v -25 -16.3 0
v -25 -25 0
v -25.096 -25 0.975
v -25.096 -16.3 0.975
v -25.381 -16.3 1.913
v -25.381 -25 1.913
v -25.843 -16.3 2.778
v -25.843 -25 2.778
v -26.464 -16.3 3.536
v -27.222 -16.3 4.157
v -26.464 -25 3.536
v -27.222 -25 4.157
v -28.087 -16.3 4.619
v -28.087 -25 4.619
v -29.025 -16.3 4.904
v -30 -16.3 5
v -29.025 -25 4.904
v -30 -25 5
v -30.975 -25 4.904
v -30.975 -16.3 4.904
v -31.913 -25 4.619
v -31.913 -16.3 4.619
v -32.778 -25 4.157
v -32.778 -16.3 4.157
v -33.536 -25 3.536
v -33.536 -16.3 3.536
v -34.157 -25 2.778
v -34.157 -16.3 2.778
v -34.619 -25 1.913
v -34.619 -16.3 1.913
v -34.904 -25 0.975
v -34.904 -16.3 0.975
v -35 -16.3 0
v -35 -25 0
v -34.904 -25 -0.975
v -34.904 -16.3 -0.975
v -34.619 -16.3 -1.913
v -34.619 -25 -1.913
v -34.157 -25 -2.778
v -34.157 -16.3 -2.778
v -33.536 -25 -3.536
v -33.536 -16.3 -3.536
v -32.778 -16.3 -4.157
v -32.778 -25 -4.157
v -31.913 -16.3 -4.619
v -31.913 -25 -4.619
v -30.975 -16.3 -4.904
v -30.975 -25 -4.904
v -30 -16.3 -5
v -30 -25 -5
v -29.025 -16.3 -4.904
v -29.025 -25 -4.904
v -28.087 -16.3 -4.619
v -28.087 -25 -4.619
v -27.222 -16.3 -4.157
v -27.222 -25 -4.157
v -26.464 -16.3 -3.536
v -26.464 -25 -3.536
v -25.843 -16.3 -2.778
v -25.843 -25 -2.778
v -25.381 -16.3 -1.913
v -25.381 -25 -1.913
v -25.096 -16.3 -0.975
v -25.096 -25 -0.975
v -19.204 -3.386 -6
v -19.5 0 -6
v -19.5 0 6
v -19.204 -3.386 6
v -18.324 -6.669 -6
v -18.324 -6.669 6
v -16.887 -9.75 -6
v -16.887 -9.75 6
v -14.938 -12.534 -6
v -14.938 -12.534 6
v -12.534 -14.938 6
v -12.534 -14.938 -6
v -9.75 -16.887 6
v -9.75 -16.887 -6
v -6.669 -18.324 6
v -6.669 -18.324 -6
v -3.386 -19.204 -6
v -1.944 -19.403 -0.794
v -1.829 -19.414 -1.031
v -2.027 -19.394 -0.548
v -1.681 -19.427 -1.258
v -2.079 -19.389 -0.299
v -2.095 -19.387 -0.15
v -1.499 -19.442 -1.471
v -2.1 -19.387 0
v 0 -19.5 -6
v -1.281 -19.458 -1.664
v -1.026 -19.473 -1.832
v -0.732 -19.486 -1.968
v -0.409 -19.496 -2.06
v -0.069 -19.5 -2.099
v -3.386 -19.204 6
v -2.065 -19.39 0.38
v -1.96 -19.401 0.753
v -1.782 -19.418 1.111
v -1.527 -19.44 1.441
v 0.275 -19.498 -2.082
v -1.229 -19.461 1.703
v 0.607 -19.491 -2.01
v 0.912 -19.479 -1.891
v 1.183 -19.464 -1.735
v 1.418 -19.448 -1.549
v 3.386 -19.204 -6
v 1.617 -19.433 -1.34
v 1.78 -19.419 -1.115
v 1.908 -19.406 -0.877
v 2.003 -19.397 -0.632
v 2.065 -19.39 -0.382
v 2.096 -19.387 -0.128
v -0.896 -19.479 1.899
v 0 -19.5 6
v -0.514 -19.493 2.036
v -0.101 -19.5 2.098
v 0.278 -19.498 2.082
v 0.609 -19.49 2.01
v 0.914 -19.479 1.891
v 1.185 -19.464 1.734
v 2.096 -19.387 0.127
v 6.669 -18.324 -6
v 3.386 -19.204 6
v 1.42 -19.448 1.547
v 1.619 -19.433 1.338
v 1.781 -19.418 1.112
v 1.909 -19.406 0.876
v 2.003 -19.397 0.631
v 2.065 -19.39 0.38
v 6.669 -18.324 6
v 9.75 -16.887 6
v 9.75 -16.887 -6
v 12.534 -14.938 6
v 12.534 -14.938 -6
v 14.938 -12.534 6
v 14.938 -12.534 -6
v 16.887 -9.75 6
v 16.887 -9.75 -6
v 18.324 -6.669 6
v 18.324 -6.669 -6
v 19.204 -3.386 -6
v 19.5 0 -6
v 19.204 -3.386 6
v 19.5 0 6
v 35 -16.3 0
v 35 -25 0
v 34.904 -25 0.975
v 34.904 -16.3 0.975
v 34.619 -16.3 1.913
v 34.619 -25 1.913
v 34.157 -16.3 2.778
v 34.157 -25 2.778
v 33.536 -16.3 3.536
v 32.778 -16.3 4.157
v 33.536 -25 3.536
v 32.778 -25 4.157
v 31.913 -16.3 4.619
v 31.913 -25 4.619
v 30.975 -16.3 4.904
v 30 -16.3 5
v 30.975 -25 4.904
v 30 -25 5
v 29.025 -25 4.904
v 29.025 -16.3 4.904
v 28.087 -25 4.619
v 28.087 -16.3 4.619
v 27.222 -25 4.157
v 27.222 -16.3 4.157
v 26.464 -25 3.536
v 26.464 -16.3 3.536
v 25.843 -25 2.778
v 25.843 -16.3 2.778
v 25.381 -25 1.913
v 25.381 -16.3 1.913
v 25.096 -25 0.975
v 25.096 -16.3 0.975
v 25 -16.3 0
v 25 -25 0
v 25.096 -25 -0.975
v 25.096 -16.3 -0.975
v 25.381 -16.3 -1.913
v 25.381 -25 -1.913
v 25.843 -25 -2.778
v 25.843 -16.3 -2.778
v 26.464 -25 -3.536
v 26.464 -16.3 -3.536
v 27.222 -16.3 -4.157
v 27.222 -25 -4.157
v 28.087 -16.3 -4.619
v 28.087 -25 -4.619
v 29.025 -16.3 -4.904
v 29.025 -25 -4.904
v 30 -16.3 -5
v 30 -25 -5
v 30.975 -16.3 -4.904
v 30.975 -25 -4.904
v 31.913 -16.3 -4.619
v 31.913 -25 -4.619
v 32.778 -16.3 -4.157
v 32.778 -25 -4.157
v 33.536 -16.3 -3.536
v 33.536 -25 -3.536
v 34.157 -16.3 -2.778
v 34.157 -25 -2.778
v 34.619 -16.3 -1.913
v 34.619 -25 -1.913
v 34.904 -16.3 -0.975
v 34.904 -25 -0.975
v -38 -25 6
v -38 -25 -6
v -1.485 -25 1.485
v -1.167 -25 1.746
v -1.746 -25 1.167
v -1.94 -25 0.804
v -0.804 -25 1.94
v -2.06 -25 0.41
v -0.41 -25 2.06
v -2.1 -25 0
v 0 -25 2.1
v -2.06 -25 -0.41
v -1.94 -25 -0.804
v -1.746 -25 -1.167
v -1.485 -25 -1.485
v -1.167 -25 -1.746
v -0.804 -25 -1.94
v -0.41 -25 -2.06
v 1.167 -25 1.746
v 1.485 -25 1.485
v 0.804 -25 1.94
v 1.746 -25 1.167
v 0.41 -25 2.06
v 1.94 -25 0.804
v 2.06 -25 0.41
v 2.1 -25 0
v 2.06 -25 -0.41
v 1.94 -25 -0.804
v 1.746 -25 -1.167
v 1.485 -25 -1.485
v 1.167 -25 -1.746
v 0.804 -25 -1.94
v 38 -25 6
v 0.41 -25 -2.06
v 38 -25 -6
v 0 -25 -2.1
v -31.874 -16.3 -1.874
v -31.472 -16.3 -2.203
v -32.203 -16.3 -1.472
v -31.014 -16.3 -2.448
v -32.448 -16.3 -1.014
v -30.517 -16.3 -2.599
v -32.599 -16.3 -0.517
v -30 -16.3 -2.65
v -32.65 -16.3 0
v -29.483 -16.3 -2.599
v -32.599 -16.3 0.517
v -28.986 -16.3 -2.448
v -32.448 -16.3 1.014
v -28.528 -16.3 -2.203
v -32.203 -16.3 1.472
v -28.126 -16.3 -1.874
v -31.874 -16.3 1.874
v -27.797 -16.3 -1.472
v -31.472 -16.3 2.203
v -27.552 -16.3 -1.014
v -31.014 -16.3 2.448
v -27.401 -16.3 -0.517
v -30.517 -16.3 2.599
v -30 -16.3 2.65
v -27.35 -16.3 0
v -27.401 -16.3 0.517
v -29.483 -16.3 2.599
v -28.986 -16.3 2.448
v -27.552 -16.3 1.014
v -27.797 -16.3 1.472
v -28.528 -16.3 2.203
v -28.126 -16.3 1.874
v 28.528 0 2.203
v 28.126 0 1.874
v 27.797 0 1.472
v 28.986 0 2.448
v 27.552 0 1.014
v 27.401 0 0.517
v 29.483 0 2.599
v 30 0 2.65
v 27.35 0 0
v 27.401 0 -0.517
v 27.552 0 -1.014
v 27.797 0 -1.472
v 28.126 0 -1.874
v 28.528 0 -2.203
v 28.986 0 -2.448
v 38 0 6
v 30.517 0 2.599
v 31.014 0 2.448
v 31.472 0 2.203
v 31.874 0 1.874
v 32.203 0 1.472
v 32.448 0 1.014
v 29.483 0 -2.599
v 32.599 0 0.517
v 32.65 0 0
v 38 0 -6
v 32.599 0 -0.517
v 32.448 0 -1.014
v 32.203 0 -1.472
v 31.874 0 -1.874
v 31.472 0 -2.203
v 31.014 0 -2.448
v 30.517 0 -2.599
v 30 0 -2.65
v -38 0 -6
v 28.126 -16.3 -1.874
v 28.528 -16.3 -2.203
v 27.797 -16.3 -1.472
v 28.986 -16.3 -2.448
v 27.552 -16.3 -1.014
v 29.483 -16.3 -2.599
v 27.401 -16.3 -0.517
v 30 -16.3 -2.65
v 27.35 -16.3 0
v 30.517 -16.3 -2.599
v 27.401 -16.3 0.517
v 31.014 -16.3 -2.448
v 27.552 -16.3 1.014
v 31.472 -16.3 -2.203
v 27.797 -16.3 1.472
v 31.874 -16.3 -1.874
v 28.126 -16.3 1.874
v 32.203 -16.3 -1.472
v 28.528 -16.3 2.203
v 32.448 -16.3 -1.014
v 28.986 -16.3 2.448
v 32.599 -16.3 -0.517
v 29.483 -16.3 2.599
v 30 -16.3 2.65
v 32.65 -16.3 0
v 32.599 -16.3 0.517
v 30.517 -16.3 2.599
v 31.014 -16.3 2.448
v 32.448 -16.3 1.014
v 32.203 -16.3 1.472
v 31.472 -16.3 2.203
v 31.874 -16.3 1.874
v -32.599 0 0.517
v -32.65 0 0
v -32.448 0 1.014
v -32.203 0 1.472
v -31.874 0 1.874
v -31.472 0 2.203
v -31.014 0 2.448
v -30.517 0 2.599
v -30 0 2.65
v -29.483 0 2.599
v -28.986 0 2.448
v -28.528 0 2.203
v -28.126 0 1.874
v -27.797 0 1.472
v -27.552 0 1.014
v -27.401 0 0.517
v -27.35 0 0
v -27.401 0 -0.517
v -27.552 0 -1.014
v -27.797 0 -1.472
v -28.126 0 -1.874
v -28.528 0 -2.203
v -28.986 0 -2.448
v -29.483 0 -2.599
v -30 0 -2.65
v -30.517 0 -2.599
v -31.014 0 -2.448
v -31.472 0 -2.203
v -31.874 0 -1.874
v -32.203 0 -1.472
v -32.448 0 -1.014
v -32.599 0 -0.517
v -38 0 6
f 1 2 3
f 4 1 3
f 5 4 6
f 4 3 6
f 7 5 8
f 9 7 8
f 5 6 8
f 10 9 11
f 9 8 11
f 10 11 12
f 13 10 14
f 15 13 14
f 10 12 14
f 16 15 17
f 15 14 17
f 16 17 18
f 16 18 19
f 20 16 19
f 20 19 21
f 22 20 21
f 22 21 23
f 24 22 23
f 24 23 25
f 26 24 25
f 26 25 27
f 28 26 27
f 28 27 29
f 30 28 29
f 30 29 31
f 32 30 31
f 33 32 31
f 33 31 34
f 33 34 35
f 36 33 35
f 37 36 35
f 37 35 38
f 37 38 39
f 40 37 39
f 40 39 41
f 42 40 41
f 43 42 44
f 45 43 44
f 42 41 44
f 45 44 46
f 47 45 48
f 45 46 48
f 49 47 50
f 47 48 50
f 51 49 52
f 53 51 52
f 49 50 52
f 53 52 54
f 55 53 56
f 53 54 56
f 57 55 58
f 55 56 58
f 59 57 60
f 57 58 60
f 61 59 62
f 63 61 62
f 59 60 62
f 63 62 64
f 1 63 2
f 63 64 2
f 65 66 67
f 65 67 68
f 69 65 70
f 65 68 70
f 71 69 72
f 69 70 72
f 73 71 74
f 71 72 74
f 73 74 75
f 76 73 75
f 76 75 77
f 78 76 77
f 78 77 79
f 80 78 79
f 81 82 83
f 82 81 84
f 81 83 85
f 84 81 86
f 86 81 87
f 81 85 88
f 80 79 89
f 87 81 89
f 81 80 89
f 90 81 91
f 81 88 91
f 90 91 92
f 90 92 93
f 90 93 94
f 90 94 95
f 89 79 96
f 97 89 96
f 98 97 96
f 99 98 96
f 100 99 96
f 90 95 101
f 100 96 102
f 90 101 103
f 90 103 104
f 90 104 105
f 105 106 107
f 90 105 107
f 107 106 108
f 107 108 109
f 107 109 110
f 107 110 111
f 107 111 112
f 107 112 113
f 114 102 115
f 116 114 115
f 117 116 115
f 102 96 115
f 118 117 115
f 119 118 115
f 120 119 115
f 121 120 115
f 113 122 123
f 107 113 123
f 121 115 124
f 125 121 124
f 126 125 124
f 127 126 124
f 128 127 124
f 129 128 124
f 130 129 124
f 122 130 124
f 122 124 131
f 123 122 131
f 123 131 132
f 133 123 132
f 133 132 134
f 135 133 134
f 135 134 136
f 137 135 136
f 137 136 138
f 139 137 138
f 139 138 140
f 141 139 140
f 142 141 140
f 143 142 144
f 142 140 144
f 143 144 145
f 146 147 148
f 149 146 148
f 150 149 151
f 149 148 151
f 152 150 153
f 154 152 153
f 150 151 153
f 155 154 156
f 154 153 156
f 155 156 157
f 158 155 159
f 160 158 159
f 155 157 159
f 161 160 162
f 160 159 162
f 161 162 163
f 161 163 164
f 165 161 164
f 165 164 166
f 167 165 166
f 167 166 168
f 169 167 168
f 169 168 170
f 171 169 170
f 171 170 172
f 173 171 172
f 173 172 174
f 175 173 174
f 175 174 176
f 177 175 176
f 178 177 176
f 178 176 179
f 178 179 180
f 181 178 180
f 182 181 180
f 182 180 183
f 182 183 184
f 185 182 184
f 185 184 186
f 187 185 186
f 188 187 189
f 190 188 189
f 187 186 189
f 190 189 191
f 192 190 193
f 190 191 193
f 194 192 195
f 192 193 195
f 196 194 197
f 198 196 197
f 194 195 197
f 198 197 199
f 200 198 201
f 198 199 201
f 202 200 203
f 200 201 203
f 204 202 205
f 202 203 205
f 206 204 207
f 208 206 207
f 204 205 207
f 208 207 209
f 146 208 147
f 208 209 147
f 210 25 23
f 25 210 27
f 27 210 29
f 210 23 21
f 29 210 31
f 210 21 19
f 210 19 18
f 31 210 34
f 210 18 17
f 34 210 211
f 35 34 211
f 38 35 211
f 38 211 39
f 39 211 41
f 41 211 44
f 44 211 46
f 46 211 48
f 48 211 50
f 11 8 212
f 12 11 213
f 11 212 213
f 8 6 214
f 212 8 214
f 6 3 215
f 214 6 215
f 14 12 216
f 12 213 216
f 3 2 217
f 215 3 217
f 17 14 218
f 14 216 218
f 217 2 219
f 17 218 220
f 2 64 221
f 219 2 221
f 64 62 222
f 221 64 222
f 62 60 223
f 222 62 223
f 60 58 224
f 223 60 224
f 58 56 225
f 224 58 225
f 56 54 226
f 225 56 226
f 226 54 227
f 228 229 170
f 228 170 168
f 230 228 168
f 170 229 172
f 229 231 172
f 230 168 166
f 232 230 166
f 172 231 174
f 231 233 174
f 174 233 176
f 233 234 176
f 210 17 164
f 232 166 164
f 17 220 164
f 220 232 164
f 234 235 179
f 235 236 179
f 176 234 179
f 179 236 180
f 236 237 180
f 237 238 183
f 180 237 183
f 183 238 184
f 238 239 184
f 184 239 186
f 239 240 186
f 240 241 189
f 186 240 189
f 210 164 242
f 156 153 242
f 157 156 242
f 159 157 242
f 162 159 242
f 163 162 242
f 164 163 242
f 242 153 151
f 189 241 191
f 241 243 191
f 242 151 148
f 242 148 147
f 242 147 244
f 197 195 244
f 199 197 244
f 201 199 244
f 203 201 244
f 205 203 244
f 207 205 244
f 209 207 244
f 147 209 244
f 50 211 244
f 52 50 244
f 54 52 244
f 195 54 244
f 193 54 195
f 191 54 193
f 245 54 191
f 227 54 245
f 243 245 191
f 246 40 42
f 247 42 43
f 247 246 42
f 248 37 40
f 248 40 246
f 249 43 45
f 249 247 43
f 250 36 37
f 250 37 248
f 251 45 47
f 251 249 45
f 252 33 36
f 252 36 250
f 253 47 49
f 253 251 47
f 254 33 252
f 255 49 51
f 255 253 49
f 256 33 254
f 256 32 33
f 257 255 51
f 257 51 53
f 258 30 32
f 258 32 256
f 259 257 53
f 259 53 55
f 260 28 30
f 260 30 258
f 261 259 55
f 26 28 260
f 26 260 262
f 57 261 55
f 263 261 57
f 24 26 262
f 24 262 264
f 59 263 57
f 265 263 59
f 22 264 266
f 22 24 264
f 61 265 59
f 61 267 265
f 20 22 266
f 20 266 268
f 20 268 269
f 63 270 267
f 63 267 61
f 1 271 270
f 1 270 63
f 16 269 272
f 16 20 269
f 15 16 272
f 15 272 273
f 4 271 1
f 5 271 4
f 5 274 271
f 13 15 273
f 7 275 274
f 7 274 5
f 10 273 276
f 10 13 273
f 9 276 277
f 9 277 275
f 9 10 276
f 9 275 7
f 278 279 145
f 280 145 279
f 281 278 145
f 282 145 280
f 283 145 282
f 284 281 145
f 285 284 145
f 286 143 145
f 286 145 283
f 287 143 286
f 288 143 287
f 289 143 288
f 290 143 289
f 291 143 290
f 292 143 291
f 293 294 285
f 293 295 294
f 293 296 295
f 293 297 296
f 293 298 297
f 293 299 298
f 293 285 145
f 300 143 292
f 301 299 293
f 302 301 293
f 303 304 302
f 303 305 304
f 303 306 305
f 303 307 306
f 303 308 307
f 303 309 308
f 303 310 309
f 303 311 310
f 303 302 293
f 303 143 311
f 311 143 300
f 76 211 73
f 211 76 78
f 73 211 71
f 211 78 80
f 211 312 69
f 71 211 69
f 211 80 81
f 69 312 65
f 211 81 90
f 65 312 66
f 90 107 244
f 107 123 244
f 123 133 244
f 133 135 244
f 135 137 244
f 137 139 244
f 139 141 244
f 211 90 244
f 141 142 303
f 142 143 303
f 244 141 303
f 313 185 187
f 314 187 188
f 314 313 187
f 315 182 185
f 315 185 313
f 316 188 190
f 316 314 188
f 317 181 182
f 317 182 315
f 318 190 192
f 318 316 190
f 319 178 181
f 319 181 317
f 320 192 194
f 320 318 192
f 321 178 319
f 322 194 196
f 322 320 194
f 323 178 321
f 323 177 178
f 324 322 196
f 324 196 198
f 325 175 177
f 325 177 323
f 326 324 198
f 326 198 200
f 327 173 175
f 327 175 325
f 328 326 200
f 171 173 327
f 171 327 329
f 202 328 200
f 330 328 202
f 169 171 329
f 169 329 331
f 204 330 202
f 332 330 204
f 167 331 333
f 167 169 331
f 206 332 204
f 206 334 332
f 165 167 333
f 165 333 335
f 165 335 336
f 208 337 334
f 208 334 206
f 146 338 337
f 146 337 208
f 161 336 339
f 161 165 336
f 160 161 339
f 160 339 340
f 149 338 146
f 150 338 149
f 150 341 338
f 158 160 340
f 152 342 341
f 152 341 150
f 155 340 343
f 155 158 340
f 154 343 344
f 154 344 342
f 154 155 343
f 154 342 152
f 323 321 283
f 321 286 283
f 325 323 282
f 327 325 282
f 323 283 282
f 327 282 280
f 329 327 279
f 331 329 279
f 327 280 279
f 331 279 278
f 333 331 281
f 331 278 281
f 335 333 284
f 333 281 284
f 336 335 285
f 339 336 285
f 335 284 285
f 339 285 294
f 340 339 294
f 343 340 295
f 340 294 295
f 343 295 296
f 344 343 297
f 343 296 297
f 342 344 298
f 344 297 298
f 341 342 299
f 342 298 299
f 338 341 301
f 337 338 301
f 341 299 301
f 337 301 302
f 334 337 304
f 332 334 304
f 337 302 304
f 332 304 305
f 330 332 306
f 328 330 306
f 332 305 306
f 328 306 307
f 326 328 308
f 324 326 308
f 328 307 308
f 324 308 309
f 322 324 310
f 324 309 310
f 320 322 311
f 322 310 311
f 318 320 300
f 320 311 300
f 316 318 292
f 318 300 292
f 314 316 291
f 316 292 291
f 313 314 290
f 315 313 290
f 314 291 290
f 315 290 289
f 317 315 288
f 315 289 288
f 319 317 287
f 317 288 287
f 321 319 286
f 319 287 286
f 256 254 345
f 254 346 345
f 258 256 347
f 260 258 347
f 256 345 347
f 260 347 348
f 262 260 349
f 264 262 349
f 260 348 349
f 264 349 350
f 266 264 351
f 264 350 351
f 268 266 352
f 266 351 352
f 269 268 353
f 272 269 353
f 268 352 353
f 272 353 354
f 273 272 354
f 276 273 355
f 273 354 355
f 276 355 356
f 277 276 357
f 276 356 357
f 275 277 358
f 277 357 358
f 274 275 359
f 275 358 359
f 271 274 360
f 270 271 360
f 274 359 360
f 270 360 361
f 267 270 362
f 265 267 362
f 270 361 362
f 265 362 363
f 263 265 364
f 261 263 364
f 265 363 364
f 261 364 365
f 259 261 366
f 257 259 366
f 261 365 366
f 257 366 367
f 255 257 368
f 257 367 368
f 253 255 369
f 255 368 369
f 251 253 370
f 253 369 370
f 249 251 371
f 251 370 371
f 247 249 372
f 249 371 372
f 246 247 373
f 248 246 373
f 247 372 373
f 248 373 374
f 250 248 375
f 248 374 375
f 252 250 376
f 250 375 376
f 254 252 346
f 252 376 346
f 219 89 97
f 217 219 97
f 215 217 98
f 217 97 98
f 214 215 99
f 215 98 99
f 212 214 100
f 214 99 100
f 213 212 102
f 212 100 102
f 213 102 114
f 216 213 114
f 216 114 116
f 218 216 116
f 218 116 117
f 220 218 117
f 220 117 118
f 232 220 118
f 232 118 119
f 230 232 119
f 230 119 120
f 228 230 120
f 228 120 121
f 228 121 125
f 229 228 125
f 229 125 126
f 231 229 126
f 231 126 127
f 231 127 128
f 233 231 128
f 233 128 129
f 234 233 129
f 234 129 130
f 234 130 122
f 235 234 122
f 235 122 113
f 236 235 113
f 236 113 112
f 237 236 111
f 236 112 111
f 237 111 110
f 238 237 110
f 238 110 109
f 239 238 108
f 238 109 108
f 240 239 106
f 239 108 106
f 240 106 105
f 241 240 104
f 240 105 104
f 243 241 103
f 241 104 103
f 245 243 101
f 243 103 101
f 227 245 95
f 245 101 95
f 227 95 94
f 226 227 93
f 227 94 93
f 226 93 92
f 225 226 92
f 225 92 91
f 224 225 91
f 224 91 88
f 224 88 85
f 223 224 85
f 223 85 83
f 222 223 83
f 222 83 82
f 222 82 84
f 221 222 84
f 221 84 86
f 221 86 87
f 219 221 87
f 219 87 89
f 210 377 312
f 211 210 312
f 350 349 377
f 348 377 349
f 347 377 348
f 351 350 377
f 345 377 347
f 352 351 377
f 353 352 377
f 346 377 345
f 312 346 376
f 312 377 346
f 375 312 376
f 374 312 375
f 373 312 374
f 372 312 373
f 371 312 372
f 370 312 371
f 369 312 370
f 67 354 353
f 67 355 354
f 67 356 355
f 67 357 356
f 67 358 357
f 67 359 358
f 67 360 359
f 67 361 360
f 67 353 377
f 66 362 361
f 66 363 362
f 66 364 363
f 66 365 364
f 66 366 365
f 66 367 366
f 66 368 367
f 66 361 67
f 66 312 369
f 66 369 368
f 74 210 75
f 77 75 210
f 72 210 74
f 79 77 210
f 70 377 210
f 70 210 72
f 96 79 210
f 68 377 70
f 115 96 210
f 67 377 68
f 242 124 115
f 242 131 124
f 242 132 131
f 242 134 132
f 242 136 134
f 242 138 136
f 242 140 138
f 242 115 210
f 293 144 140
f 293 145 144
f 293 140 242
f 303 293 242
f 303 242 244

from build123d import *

# Parameters (mm, degrees)
SKETCH_1_W                = 76
SKETCH_1_H                = 12
EXTRUDE_1_DEPTH           = 25
CUT_EXTRUDE_1_REACH       = 49.043
SKETCH_2_R                = 19.5
HOLE_WIZARD_M5_1_D        = 4.2
HOLE_WIZARD_1_D           = 5.3
HOLE_WIZARD_1_CBORE_D     = 10
HOLE_WIZARD_1_CBORE_DEPTH = 8.7


with BuildPart() as part:
    # 草图1 → 凸台-拉伸1 (new body)
    with BuildSketch(Plane(origin=(0, 0, 0), x_dir=(1, 0, 0), z_dir=(0, 1, 0))):
        Rectangle(SKETCH_1_W, SKETCH_1_H)
    extrude(amount=-EXTRUDE_1_DEPTH)

    # 草图2 → 切除-拉伸1 (cut, up to next)
    with BuildSketch(Plane.XY.offset(6), mode=Mode.PRIVATE) as cut_extrude_1_sk1:
        Circle(SKETCH_2_R)
    cut_extrude_1_tool1 = extrude(cut_extrude_1_sk1.sketch, amount=-CUT_EXTRUDE_1_REACH, mode=Mode.PRIVATE) & part.part
    add(cut_extrude_1_tool1.solids().sort_by_distance((0, 0, 6))[0], mode=Mode.SUBTRACT)

    # M5 螺纹孔1 (through all)
    with Locations(Plane.XZ.offset(25)):
        with Locations((0, 0)):
            Hole(HOLE_WIZARD_M5_1_D / 2)

    # 打孔尺寸根据内六角圆柱头螺钉的类型1 (through all)
    with Locations(Plane.XZ.offset(25)):
        with Locations((-30, 0), (30, 0)):
            CounterBoreHole(HOLE_WIZARD_1_D / 2, HOLE_WIZARD_1_CBORE_D / 2, HOLE_WIZARD_1_CBORE_DEPTH)


solid = part.part
